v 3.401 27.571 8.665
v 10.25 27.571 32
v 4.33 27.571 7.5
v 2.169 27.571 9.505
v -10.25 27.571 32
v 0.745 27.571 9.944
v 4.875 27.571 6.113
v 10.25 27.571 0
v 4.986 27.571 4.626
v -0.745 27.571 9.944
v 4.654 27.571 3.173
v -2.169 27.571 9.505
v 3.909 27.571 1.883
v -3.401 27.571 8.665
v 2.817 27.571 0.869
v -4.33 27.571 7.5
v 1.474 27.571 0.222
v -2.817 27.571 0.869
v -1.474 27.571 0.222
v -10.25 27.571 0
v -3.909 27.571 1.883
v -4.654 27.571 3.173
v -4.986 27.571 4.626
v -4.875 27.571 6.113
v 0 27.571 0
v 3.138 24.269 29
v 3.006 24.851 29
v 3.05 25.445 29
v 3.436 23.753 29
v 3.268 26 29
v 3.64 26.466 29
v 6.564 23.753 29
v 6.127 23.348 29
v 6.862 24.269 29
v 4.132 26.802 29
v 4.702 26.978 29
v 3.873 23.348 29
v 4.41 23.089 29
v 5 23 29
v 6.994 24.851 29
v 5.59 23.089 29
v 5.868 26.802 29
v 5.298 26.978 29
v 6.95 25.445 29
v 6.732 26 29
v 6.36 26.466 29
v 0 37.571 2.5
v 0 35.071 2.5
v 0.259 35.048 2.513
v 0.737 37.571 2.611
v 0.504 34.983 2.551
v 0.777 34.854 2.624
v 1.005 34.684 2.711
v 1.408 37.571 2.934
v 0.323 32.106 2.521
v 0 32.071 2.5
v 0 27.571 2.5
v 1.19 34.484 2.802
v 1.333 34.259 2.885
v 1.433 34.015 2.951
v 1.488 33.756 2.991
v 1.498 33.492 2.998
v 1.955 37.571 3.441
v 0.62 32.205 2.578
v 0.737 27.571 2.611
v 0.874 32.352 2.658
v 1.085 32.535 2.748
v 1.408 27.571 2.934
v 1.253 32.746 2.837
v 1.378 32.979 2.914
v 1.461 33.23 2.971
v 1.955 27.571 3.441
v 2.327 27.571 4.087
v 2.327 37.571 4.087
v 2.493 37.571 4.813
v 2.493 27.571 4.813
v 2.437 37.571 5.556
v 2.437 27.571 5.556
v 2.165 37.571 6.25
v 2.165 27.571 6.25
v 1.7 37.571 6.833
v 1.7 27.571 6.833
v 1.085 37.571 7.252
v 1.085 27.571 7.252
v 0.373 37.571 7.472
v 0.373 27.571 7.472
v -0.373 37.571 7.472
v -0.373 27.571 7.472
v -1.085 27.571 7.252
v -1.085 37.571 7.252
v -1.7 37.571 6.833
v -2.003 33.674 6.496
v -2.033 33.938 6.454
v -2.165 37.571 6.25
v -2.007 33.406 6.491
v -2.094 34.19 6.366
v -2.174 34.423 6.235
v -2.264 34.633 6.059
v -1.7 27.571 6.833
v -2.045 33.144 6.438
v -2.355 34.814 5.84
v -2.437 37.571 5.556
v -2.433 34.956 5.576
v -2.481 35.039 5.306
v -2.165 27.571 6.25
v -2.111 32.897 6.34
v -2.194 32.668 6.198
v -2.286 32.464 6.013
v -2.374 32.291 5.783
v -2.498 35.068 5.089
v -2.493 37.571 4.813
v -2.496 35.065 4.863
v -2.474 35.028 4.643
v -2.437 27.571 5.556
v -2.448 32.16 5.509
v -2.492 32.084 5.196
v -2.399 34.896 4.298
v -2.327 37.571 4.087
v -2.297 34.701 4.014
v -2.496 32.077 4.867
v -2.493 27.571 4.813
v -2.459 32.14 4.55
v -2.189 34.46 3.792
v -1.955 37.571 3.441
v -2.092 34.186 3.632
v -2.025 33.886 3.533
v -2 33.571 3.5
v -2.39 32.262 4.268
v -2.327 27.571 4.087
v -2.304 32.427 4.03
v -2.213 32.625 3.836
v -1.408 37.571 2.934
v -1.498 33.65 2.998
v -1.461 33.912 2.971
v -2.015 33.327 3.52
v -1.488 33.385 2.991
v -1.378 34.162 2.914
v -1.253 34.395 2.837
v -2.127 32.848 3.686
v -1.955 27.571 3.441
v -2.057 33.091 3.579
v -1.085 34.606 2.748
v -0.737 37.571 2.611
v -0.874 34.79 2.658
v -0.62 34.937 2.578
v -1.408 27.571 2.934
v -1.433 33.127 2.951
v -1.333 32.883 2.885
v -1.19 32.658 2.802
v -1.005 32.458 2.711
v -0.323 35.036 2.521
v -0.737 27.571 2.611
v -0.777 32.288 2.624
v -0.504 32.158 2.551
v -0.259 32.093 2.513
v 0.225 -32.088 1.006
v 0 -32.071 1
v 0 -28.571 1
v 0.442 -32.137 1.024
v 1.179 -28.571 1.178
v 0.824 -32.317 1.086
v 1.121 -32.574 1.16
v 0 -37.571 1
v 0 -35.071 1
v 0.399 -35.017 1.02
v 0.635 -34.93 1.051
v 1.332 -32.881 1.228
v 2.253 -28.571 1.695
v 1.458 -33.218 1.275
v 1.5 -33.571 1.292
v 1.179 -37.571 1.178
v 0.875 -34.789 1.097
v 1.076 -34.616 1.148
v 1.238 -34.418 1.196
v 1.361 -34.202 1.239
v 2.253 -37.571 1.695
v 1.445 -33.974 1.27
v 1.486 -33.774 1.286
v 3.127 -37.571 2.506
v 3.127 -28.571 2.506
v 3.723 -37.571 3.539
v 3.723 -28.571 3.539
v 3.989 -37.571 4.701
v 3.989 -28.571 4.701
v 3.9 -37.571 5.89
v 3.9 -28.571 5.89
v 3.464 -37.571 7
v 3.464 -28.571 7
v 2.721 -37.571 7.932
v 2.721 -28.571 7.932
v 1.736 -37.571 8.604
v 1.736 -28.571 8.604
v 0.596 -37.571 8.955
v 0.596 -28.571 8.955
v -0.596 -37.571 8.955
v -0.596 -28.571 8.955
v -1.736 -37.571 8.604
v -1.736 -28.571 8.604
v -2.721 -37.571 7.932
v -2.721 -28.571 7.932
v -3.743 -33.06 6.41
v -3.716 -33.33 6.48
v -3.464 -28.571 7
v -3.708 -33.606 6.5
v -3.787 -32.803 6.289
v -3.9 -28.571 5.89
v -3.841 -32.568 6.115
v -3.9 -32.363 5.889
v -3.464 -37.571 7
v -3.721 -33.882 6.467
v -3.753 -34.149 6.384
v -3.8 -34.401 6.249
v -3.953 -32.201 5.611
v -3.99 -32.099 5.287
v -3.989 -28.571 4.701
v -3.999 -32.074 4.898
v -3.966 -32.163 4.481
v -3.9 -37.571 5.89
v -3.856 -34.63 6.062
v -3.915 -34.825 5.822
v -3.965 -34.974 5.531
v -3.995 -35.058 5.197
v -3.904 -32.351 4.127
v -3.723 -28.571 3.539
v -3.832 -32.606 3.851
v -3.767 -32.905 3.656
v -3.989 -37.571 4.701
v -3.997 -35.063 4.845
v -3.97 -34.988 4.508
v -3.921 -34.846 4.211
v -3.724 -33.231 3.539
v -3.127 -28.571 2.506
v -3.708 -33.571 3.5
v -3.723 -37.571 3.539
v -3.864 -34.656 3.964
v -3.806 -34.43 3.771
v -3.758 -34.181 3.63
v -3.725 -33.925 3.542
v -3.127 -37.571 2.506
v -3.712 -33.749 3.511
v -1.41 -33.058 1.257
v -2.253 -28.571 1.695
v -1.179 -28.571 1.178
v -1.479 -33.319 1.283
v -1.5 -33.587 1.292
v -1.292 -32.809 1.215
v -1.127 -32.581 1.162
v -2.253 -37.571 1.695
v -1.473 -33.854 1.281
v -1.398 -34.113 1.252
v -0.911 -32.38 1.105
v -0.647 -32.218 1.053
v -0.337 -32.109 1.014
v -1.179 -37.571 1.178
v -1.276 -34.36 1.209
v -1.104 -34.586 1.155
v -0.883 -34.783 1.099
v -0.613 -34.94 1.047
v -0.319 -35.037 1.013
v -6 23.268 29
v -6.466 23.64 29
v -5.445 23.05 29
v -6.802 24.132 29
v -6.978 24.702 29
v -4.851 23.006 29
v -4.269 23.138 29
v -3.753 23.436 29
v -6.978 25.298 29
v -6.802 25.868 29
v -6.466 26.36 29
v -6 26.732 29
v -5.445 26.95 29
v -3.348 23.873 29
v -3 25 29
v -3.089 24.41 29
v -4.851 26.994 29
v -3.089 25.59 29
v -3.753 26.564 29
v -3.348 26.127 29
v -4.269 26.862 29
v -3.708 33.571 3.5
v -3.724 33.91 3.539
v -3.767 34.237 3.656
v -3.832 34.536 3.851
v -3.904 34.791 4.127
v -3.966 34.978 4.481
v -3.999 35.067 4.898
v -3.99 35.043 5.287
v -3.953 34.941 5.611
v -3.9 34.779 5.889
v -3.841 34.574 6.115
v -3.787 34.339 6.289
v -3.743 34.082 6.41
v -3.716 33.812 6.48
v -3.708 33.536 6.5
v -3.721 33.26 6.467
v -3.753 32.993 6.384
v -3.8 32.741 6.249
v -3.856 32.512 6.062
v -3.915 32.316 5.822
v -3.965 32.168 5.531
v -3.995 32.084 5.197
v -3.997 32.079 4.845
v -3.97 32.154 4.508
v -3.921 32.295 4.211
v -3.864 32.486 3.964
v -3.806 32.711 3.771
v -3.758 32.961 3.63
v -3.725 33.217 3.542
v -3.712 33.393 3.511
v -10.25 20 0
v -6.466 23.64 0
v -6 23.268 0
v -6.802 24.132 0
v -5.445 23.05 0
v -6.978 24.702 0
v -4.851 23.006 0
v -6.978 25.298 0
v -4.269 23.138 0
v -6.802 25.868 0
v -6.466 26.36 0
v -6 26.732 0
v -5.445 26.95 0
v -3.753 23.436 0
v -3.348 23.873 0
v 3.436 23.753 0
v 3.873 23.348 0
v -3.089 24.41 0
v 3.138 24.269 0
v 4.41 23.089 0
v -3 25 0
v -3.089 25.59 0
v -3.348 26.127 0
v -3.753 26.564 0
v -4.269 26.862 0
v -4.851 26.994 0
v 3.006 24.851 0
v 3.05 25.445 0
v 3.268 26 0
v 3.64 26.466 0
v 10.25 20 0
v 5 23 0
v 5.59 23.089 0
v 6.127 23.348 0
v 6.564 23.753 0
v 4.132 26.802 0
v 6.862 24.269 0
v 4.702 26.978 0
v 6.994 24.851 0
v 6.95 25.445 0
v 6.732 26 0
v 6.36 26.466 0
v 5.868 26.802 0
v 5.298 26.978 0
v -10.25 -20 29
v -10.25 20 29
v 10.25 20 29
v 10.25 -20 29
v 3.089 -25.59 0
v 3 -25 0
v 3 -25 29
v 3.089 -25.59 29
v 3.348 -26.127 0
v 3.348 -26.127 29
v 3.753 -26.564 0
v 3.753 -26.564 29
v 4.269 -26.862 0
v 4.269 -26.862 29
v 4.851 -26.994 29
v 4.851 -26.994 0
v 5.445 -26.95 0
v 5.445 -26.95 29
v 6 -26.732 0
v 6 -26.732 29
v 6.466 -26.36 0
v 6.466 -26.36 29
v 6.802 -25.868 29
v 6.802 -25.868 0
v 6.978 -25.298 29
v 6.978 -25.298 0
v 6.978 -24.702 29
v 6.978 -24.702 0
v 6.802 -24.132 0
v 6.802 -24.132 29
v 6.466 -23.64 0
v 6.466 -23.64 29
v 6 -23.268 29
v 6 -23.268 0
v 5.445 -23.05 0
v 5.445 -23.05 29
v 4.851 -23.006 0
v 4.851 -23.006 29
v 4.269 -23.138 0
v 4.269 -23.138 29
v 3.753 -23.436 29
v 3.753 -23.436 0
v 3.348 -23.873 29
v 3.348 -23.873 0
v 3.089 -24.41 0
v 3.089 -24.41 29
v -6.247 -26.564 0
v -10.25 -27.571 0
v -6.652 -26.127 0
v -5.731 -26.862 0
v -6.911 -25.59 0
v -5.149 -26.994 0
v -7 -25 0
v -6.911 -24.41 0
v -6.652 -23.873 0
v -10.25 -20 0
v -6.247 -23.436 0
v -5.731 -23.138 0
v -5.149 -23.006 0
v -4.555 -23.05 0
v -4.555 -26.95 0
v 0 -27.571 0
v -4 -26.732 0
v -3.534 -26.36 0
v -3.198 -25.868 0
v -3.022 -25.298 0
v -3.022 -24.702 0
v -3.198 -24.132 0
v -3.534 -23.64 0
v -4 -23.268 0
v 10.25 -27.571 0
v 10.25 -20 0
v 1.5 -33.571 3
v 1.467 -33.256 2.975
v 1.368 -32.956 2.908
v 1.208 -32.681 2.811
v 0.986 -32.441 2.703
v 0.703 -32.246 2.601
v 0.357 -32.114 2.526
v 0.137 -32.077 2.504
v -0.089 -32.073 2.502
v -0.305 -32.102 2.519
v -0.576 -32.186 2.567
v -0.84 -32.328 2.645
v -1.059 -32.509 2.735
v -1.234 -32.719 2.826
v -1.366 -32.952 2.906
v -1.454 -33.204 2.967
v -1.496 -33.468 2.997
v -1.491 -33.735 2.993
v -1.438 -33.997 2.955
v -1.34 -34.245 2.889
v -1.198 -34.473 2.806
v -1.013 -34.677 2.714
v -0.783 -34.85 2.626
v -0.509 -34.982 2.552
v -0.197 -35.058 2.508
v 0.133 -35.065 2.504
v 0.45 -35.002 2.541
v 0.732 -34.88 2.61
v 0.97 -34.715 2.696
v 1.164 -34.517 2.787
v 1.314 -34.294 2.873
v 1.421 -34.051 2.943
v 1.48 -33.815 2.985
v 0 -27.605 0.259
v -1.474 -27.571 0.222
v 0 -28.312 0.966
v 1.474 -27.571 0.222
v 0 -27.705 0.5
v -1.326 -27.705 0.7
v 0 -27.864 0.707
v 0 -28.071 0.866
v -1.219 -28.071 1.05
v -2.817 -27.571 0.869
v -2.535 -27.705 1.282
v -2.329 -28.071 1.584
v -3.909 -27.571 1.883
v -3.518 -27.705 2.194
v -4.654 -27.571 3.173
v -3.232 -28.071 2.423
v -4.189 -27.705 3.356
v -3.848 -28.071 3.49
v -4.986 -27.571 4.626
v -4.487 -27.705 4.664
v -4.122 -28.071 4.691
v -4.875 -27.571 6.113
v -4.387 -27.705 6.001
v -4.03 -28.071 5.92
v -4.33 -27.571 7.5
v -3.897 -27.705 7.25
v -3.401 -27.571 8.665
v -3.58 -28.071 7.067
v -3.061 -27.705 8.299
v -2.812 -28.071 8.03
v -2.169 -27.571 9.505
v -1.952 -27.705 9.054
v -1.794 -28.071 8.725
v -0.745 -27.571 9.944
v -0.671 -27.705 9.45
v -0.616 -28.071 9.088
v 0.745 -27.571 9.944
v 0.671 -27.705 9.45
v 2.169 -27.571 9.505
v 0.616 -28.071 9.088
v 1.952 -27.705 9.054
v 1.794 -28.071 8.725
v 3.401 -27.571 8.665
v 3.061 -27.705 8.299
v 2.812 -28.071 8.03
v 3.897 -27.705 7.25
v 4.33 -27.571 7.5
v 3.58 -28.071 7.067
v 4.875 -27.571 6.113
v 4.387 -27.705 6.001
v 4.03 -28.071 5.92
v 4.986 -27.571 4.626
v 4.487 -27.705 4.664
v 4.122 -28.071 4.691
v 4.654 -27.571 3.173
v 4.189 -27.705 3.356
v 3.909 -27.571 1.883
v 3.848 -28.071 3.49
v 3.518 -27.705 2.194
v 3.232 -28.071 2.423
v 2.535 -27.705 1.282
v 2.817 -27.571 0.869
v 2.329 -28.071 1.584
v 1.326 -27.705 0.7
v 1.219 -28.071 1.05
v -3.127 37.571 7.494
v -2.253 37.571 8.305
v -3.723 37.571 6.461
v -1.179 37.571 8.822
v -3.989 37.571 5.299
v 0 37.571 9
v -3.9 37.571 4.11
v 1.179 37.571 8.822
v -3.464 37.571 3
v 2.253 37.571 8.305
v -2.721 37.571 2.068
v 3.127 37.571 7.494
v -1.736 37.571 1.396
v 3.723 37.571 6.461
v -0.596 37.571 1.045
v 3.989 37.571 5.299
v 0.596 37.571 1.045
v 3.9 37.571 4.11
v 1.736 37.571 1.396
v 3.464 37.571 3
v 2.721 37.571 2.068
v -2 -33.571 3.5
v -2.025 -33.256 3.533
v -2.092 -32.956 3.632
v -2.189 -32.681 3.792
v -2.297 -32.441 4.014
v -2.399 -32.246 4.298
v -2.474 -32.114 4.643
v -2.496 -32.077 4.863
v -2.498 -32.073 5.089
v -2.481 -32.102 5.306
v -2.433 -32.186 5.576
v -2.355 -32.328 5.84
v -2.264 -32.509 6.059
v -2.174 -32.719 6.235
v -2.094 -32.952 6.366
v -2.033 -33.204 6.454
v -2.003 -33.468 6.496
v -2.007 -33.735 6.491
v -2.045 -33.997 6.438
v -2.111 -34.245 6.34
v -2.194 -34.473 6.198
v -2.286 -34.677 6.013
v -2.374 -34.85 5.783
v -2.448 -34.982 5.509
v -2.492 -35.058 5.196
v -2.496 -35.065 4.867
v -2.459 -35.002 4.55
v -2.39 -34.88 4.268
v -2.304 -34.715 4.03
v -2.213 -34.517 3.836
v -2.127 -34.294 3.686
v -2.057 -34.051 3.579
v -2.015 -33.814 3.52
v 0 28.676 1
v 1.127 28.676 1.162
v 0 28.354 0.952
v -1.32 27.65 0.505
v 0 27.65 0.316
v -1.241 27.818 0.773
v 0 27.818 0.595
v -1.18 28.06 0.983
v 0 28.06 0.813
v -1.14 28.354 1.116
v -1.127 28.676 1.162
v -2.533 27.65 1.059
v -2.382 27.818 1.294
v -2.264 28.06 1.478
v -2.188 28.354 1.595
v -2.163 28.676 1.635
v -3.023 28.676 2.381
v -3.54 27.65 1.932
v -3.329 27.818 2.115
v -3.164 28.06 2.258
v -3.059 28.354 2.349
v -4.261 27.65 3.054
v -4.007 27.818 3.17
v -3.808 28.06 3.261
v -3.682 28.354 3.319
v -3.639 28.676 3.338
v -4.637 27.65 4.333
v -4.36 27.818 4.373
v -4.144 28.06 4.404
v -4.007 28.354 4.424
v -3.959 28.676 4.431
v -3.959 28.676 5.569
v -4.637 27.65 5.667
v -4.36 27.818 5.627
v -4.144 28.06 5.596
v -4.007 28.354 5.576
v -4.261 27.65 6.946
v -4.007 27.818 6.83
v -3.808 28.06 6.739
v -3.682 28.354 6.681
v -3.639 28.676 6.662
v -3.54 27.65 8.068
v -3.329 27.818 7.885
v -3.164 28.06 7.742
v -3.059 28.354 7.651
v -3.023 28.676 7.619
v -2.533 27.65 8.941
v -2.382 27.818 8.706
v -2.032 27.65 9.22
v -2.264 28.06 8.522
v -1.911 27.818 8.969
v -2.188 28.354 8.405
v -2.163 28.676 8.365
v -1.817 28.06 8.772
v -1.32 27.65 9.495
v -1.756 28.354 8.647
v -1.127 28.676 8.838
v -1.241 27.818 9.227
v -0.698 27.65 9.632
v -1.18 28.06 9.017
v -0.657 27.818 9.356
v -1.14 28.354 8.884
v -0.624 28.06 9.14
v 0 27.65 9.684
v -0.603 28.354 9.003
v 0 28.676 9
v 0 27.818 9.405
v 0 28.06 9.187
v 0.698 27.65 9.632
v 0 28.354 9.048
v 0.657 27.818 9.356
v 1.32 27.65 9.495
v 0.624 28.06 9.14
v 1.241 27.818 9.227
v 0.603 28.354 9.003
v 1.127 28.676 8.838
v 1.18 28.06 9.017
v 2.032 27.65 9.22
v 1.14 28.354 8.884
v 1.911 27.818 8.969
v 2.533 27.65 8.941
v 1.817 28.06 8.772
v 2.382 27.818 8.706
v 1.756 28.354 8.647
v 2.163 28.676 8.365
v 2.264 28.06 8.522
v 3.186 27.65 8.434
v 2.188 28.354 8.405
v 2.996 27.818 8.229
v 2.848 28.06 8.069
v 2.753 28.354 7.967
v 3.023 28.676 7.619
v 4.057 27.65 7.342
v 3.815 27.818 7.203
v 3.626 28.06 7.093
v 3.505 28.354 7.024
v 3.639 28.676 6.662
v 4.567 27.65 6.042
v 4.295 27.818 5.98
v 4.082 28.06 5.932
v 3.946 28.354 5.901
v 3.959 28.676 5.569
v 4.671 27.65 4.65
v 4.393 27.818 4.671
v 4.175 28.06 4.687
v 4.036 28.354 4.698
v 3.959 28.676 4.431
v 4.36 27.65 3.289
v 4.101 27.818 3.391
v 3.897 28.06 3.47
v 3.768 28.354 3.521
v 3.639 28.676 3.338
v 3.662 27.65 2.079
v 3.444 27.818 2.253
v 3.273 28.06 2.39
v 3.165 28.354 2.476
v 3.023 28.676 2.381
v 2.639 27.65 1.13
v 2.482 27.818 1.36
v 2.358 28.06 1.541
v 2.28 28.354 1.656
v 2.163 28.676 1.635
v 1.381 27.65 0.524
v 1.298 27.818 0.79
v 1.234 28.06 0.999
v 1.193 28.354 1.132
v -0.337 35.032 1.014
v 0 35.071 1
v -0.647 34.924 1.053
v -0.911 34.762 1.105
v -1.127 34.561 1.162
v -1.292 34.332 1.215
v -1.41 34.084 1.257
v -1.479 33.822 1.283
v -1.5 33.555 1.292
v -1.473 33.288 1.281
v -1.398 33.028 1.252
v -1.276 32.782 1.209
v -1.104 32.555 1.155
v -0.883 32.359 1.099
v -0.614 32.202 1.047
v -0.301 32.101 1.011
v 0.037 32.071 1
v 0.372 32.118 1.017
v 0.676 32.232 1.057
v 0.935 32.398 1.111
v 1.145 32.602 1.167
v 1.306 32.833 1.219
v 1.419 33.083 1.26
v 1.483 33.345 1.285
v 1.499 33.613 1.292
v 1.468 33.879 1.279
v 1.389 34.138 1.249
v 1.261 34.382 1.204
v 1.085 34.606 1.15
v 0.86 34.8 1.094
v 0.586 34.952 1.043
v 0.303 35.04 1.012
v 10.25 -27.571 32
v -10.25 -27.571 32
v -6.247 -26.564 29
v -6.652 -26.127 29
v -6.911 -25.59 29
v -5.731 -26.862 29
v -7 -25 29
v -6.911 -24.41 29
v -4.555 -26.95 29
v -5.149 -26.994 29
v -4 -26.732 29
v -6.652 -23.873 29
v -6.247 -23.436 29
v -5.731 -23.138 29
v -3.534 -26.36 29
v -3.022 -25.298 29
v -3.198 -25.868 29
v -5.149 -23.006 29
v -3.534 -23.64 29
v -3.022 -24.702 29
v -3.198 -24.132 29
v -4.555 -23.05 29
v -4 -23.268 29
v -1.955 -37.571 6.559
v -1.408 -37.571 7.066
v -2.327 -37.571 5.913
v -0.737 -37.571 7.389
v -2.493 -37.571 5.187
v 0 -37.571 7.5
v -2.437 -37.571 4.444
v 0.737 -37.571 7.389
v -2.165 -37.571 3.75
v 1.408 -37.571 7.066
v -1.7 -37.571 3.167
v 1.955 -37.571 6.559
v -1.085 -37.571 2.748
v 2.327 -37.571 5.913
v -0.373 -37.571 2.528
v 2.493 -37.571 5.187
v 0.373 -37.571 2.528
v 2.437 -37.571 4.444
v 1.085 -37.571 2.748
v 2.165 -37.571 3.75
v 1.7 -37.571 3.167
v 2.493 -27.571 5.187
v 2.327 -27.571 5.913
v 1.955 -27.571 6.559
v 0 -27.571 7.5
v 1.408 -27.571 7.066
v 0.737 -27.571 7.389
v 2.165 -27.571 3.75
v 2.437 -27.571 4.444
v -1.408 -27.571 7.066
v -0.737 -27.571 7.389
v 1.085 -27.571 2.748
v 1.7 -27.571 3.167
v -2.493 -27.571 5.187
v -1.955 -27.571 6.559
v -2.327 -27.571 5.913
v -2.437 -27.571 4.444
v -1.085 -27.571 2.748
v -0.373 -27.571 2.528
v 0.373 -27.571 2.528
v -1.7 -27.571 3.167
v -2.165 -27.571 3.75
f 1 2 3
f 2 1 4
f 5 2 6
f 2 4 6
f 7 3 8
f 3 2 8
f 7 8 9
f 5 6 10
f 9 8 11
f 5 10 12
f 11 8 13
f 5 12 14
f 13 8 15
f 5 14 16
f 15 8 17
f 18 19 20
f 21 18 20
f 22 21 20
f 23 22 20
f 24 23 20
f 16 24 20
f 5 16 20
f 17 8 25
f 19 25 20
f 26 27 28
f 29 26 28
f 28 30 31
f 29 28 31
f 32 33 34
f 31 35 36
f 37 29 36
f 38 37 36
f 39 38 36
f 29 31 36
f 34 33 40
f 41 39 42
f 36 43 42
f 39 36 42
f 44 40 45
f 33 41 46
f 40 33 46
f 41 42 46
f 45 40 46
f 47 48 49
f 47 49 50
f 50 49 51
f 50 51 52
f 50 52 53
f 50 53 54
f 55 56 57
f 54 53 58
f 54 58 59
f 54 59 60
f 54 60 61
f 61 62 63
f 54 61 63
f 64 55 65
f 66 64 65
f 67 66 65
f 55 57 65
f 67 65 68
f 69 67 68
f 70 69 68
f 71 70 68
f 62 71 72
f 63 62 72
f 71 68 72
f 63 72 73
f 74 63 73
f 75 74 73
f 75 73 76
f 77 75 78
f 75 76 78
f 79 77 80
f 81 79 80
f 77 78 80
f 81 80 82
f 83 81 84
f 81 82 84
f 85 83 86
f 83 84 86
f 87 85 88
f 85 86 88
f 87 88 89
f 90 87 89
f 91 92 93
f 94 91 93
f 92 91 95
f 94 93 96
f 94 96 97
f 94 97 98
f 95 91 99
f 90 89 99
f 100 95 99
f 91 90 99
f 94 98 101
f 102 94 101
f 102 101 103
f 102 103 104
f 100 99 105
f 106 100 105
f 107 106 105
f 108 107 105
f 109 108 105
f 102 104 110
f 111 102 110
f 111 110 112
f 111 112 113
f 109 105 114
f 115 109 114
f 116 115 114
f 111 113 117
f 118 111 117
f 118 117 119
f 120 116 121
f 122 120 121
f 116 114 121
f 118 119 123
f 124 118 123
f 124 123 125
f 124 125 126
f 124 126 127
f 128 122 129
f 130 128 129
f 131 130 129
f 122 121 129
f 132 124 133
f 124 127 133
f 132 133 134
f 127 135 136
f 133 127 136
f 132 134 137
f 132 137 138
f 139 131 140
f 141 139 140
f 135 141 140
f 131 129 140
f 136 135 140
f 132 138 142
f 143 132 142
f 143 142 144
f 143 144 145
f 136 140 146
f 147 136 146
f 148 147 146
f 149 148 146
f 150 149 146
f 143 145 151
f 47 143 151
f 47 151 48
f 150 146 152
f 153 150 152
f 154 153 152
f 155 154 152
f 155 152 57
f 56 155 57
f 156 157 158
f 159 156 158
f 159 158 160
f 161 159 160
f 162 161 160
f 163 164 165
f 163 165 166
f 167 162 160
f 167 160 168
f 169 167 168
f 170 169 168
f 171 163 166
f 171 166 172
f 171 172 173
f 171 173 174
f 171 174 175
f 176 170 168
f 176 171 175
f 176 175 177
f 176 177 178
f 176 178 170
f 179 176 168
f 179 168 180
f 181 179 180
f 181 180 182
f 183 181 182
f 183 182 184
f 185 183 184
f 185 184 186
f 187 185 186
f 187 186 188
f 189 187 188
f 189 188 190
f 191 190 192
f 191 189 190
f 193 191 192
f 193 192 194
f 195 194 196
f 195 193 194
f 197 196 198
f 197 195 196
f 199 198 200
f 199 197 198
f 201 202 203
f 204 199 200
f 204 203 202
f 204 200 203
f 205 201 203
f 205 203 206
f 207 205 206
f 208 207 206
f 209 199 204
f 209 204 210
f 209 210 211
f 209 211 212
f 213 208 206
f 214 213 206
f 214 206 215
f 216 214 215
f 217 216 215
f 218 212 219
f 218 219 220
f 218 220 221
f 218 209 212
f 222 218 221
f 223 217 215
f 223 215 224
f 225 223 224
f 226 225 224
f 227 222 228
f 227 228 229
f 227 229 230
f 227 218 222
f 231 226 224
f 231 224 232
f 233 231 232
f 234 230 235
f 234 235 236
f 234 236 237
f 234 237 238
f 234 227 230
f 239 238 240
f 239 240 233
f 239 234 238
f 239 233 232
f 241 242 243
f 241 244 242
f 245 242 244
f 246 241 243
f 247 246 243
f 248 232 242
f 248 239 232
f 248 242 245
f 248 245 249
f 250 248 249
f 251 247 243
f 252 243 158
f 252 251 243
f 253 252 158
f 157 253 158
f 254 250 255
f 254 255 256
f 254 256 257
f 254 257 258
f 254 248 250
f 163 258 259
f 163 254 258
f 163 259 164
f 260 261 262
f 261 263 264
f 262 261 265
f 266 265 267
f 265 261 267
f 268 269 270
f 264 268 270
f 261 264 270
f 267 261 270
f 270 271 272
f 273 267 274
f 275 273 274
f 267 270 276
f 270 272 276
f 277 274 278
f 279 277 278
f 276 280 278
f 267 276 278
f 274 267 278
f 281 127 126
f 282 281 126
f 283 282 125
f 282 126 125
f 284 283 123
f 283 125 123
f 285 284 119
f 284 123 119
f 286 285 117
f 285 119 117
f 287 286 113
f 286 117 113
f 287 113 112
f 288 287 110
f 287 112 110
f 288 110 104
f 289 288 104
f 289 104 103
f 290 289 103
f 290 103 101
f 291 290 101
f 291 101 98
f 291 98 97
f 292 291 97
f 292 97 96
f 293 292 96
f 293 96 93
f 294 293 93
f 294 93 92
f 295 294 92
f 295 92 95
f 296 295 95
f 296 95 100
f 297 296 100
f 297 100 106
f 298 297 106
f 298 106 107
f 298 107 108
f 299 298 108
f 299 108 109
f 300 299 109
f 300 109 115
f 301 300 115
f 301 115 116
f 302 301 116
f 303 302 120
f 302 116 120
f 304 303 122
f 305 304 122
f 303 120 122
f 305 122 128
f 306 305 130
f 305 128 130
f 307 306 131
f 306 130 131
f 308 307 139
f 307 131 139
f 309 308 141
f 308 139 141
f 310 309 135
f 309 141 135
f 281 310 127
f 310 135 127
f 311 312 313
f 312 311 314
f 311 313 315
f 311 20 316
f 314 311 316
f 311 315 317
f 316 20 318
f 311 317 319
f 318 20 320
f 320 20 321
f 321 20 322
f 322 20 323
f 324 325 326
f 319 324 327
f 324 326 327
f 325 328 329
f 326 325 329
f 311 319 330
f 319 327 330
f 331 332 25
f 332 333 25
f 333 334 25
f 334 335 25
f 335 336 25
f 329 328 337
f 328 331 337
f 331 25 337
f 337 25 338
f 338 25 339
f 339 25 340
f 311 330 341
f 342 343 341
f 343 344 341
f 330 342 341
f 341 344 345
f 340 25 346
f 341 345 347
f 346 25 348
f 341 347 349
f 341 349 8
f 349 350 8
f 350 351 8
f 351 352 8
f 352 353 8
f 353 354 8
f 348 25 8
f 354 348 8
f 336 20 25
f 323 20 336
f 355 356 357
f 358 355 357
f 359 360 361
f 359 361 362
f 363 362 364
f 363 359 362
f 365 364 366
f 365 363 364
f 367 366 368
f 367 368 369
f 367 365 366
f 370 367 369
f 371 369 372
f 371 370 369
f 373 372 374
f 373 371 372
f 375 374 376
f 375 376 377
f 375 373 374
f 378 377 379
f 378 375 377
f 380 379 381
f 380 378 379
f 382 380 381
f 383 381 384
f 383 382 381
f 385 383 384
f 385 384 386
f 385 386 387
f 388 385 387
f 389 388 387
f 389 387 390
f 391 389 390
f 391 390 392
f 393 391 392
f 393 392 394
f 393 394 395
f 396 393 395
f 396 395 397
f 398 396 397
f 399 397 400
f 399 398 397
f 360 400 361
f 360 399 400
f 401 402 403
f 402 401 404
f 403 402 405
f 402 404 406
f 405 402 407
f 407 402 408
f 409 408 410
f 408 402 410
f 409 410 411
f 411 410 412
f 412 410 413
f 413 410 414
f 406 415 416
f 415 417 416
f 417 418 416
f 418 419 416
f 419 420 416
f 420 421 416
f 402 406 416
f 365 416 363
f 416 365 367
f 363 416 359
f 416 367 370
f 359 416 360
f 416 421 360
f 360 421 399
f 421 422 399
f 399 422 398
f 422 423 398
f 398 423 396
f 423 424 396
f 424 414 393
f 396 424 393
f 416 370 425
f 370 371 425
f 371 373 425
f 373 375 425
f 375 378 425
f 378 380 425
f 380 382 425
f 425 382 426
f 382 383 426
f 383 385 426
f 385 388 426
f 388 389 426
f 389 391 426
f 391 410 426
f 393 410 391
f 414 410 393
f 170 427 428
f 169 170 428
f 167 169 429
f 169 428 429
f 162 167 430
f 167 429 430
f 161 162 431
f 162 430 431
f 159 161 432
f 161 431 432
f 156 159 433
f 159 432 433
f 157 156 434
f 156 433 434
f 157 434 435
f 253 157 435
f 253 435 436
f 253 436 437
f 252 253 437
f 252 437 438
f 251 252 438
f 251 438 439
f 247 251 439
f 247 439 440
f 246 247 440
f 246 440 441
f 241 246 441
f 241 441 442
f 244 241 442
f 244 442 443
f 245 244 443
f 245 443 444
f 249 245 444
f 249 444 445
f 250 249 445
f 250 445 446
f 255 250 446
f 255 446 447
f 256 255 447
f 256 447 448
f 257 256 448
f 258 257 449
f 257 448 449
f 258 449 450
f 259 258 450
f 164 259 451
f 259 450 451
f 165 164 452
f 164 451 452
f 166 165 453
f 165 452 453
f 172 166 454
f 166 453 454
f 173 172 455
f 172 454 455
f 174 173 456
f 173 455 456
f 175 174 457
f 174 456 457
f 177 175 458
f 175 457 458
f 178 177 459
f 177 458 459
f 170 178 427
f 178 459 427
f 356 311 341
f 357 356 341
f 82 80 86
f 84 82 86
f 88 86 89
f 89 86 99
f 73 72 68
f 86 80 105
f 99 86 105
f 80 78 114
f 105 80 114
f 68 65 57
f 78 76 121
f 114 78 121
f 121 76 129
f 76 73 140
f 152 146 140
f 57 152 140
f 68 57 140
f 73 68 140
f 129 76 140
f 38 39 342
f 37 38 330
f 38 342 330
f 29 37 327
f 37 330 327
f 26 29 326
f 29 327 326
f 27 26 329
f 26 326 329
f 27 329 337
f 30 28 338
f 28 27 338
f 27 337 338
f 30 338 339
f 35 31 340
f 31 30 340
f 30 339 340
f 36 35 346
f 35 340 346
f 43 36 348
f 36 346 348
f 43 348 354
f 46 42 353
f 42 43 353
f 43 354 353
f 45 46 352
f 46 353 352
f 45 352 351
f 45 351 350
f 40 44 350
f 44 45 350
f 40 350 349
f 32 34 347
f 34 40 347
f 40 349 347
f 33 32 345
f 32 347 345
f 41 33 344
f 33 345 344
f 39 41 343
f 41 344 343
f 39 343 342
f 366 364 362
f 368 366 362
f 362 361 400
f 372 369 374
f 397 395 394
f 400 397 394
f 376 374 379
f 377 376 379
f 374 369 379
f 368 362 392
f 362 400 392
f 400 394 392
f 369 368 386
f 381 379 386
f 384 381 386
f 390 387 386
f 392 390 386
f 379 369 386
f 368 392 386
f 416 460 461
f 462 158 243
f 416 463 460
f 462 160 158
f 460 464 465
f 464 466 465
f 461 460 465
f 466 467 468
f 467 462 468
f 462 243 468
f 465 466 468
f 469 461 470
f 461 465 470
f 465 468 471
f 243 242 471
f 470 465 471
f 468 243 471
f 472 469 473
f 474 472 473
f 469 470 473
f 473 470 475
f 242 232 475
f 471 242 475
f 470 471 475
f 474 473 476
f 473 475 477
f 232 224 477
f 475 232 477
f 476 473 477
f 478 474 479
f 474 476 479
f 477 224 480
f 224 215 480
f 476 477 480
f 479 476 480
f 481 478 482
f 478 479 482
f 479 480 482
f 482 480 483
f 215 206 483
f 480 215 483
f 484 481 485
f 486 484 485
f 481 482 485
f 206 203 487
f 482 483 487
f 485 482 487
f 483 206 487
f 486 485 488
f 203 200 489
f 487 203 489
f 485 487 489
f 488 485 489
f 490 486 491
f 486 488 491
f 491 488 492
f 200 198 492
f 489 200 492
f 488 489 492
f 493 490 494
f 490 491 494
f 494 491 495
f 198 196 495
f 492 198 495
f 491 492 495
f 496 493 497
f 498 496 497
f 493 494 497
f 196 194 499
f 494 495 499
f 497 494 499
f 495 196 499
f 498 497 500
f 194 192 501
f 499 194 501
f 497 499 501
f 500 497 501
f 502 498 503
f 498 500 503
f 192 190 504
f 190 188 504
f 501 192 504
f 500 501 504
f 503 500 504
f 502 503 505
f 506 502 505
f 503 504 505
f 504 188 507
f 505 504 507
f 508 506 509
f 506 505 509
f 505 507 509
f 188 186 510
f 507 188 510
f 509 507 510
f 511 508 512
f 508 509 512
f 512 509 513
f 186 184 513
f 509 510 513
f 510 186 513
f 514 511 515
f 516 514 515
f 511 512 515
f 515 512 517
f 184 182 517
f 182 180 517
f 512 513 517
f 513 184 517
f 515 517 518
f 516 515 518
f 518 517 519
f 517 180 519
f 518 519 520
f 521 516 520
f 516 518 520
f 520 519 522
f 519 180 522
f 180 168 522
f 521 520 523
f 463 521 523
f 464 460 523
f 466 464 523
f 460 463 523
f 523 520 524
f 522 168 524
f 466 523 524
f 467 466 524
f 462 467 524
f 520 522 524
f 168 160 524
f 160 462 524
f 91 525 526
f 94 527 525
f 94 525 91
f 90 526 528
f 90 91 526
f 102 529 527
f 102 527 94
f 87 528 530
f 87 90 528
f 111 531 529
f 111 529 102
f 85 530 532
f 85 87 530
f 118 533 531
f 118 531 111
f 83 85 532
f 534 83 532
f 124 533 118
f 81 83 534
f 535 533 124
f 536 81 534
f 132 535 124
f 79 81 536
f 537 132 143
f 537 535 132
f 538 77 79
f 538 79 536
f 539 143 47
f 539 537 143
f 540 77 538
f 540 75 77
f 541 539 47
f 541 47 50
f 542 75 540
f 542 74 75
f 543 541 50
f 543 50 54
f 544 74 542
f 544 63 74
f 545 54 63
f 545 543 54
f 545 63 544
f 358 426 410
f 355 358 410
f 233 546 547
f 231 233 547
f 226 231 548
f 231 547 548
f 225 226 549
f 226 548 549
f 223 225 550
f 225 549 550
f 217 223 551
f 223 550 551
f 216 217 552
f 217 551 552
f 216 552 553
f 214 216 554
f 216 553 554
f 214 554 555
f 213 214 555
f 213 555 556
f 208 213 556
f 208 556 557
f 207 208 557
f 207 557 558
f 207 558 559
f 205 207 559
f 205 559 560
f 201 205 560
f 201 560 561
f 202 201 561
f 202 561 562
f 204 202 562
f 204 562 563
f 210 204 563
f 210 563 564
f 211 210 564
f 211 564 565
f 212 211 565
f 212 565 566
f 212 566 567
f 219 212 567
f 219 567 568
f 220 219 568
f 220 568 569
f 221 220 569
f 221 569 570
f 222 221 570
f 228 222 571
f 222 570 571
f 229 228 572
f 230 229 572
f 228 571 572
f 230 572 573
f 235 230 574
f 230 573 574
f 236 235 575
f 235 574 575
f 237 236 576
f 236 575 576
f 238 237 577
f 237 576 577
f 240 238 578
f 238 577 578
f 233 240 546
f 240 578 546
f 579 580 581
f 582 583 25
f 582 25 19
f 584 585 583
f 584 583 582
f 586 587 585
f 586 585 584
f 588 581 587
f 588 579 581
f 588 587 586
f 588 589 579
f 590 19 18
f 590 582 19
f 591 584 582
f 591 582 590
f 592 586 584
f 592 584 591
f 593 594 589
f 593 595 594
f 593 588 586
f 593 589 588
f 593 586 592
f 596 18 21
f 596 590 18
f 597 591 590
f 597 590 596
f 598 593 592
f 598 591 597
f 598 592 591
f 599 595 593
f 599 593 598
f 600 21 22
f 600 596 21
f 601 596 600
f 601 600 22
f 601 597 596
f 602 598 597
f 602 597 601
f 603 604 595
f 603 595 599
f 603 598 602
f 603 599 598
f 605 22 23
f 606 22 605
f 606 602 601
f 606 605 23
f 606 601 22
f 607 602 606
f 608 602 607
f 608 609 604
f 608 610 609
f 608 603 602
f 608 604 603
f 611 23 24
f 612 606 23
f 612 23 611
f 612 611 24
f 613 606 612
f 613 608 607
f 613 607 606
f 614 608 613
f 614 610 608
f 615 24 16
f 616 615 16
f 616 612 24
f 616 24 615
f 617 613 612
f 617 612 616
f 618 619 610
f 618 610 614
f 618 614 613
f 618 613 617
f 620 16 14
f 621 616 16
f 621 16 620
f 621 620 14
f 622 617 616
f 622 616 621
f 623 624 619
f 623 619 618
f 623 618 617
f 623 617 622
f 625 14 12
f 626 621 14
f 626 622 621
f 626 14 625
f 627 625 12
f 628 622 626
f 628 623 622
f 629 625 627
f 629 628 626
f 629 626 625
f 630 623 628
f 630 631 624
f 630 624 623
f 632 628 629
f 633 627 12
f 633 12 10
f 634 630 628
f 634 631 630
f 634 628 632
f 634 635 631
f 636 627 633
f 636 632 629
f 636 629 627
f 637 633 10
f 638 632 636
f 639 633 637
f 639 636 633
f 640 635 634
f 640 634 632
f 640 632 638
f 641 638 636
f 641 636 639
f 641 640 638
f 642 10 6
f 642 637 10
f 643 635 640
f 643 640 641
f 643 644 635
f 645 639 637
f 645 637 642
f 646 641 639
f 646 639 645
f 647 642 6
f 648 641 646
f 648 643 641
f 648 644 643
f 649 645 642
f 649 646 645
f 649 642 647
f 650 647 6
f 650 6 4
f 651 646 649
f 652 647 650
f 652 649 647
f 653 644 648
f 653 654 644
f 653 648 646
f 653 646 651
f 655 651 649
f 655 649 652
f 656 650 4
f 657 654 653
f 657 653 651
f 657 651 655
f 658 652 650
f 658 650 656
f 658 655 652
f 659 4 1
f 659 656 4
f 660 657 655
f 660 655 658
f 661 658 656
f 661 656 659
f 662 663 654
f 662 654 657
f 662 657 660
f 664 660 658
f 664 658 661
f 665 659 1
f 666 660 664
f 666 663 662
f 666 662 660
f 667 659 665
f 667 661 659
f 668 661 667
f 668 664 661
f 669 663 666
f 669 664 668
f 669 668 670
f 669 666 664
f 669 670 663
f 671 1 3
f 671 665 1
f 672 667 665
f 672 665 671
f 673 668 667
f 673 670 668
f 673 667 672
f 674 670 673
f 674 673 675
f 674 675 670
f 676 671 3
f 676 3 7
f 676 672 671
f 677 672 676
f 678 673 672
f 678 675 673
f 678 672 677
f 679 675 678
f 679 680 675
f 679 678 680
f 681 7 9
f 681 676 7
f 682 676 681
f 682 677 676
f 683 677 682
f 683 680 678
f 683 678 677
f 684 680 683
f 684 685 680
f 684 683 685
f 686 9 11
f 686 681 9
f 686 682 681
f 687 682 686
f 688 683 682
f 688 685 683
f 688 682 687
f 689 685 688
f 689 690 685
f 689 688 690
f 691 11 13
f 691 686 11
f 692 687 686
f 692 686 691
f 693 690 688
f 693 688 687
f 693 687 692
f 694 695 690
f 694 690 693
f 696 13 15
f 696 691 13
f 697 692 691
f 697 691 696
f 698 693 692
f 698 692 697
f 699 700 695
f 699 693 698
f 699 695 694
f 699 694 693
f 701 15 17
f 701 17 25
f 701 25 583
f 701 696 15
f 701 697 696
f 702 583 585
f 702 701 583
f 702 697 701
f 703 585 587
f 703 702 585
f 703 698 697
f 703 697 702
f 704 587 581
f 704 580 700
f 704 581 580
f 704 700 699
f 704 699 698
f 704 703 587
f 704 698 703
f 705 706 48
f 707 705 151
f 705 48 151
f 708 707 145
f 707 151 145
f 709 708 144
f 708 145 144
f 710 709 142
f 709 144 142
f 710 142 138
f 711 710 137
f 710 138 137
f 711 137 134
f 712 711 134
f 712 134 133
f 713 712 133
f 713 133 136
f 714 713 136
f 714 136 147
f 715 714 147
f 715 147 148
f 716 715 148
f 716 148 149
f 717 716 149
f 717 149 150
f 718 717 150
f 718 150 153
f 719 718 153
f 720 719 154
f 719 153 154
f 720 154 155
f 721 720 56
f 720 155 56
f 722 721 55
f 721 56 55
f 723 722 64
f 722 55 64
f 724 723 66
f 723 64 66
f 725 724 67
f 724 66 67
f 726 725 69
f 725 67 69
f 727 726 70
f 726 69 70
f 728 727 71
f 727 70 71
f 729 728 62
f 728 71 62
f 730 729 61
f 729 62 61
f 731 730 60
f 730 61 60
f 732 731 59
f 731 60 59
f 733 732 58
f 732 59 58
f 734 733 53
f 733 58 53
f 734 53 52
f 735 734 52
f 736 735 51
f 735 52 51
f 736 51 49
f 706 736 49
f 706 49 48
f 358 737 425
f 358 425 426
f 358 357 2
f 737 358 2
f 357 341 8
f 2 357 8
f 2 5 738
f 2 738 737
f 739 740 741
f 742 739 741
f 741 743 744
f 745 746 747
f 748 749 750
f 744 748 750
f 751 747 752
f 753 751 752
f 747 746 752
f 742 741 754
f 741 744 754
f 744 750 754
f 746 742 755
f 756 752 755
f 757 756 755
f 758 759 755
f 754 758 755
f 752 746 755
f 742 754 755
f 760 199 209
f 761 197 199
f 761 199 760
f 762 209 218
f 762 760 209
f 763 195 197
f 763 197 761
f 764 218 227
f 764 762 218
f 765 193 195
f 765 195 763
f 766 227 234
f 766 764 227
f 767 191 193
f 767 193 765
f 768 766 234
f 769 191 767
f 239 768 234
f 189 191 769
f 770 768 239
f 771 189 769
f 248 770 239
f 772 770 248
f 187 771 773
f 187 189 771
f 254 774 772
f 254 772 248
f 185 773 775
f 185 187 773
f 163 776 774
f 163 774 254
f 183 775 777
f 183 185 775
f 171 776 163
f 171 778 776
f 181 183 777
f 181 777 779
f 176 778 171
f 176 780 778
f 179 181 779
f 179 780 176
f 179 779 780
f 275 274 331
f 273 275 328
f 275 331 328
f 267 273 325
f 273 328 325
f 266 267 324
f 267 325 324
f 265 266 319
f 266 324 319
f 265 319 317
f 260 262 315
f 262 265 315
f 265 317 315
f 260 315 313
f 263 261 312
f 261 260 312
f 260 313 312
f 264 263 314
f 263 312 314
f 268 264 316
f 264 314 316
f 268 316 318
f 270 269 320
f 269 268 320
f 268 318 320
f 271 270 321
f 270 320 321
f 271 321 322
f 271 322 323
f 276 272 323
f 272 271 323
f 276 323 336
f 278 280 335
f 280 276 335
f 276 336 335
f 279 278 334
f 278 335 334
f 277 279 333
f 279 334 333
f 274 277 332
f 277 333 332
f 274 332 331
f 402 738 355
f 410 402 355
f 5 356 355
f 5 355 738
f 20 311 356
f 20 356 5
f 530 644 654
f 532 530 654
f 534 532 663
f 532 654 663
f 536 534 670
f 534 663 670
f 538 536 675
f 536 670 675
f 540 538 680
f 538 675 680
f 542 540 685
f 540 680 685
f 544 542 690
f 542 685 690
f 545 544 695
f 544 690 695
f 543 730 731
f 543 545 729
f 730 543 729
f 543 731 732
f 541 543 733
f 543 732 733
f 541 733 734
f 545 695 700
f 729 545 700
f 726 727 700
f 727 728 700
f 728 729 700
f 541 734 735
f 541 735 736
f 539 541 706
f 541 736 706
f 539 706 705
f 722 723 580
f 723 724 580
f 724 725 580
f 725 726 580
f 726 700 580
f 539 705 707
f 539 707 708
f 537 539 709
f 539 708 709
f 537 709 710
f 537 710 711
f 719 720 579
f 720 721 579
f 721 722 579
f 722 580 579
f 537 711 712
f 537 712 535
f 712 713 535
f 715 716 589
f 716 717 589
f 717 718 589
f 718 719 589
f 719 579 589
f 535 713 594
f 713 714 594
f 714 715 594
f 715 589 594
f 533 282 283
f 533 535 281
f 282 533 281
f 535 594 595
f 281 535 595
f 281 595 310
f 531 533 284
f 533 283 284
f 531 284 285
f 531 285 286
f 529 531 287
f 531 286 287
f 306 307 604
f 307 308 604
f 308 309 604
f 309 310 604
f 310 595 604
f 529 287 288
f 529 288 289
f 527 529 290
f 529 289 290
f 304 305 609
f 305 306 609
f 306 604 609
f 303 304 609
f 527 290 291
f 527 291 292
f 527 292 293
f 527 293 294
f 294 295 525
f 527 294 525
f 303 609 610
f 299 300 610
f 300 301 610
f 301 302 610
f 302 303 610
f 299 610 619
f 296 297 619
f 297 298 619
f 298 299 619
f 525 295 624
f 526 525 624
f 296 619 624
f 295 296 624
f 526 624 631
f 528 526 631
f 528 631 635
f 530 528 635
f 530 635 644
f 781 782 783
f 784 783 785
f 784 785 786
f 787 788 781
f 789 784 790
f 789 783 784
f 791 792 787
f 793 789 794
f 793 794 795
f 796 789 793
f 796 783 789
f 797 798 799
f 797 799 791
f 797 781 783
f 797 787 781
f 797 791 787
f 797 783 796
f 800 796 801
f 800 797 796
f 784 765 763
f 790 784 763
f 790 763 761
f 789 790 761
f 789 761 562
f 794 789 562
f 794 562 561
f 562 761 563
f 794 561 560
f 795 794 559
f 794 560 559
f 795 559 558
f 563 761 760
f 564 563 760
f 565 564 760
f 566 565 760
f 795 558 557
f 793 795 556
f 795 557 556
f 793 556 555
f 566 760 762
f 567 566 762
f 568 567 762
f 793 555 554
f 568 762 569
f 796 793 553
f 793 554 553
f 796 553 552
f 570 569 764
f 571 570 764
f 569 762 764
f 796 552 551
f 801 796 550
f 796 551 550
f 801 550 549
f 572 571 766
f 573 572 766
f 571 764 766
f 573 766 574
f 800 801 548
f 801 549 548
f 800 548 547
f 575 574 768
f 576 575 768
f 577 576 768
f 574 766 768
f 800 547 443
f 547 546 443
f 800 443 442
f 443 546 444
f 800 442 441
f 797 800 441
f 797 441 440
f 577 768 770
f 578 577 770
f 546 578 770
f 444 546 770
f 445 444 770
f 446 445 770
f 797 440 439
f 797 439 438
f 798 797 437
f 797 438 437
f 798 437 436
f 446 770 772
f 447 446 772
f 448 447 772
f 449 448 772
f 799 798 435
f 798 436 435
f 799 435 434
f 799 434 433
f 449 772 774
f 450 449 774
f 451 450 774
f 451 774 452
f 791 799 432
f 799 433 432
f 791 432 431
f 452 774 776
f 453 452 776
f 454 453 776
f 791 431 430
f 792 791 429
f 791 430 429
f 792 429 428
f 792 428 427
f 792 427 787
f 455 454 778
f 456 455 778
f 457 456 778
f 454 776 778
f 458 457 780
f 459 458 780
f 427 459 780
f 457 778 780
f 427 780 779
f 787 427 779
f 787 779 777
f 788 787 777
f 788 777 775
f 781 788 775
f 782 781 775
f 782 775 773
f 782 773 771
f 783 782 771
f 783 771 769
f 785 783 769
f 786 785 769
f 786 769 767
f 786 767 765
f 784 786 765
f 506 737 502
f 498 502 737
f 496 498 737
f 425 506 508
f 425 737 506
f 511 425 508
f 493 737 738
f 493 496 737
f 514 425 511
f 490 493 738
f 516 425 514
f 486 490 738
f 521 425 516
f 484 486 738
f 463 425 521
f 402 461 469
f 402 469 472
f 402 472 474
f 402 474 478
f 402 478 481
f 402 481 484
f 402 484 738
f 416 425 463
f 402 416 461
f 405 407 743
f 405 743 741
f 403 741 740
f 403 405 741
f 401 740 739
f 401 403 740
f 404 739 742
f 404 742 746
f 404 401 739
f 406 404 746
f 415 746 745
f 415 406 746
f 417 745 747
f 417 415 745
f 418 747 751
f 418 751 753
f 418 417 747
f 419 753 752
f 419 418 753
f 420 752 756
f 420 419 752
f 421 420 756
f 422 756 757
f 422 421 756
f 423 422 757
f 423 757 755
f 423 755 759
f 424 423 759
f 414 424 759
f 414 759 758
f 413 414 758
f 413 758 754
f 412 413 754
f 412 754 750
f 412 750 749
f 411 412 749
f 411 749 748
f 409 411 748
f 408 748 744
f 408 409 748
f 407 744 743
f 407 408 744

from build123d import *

# Parameters (mm, degrees)
SKETCH_1_R          = 2.000000000000001
EXTRUDE_1_DEPTH     = 29
SKETCH_2_W          = 20.5
SKETCH_2_H          = 70.28340969233892
EXTRUDE_2_DEPTH     = 3
SKETCH_3_W          = 20.5
SKETCH_3_H          = 7.570852423084727
CUT_EXTRUDE_1_DEPTH = 49.62100286394029
SKETCH_5_R          = 2.5
EXTRUDE_3_DEPTH     = 10
CUT_EXTRUDE_2_REACH = 75.297
SKETCH_8_R          = 1.6000000000000003
SKETCH_9_W          = 20.5
SKETCH_9_H          = 32
CUT_EXTRUDE_3_DEPTH = 65.57298284377197
SKETCH_12_W         = 20.499999999999996
SKETCH_12_H         = 7.57085242308473
SKETCH_12_R         = 2.0000000000000018
SKETCH_12_R_2       = 2.000000000000001
EXTRUDE_5_DEPTH     = 30
EXTRUDE_6_DEPTH     = 10
SKETCH_16_R         = 1.5000000000000004
CUT_EXTRUDE_5_DEPTH = 48.388093987806805
SKETCH_17_R         = 1.5000000000000004
CUT_EXTRUDE_6_DEPTH = 51.404676958704755
EXTRUDE_START       = 10
SKETCH_19_R         = 4
SKETCH_19_R_2       = 2.5000000000000004
EXTRUDE_7_DEPTH     = 10
SKETCH_21_R         = 1.5000000000000004
CUT_EXTRUDE_7_DEPTH = 48.38809406709012
SKETCH_22_R         = 1.5000000000000004
CUT_EXTRUDE_8_DEPTH = 51.404676958704755


with BuildPart() as part:
    # 草图1 → 凸台-拉伸1 (new body)
    # profile 1 of 3: a face of its own
    with BuildSketch(Plane.XY):
        with BuildLine():
            Line((-10.250000000000004, 35.14170484616946), (-10.250000000000004, 20))
            Line((-10.25, 20.000000000000004), (-4.999999999999999, 20.000000000000004))
            Line((-4.999999999999999, 20.000000000000004), (-4.999999999999999, 23.000000000000004))
            ThreePointArc((-5.000000000000001, 23.000000000000004), (-6.414213562373094, 26.4142135623731), (-2.9999999999999982, 25.000000000000004))
            Line((-2.9999999999999982, 25.000000000000004), (3, 25.000000000000004))
            ThreePointArc((3, 25.000000000000004), (5.000000000000001, 27.000000000000004), (7.000000000000002, 25.000000000000004))
            ThreePointArc((7.000000000000002, 25.000000000000004), (6.414213562373095, 23.585786437626908), (4.999999999999999, 23.000000000000004))
            Line((5.000000000000001, 23.000000000000004), (5.000000000000001, 20.000000000000004))
            Line((5, 20.000000000000004), (10.249999999999996, 20.000000000000004))
            Line((10.249999999999996, 20), (10.249999999999996, 35.14170484616946))
            Line((10.249999999999996, 35.14170484616946), (-10.250000000000004, 35.14170484616946))
        make_face()
    # profile 2 of 3: a face of its own
    with BuildSketch(Plane.XY):
        Polygon((10.249999999999996, -20), (-10.25, -20), (-10.250000000000004, -35.14170484616946), (10.249999999999996, -35.14170484616946), align=None)
        with Locations(Location((-4.999999999999999, -25.000000000000004, 0), (0, 0, 180))):
            Circle(SKETCH_1_R, mode=Mode.SUBTRACT)
        with Locations(Location((5.000000000000001, -25.000000000000004, 0), (0, 0, 180))):
            Circle(SKETCH_1_R, mode=Mode.SUBTRACT)
    # profile 3 of 3: a face of its own
    with BuildSketch(Plane.XY):
        with BuildLine():
            Line((-4.999999999999999, 23.000000000000004), (-4.999999999999999, 20.000000000000004))
            Line((-4.999999999999999, 20.000000000000004), (5, 20.000000000000004))
            Line((5.000000000000001, 20.000000000000004), (5.000000000000001, 23.000000000000004))
            ThreePointArc((4.999999999999999, 23.000000000000004), (3.585786437626904, 23.585786437626908), (3, 25.000000000000004))
            Line((3, 25.000000000000004), (-2.9999999999999982, 25.000000000000004))
            ThreePointArc((-2.9999999999999982, 25.000000000000004), (-3.585786437626905, 23.585786437626908), (-5.000000000000001, 23.000000000000004))
        make_face()
    extrude(amount=EXTRUDE_1_DEPTH)

    # 草图2 → 凸台-拉伸2 (add)
    with BuildSketch(Plane.XY.offset(29)):
        Rectangle(SKETCH_2_W, SKETCH_2_H)
    extrude(amount=EXTRUDE_2_DEPTH)

    # 草图3 → 切除-拉伸1 (cut, through all)
    with BuildSketch(Plane(origin=(0, 0, 0), x_dir=(-1, 0, 0), z_dir=(0, 0, -1))):
        with Locations((3.55e-15, -31.356278634627095)):
            Rectangle(SKETCH_3_W, SKETCH_3_H)
        Polygon((-10.249999999999996, 35.14170484616946), (-10.249999999999996, 27.57085242308473), (10.250000000000004, 27.570852423084734), (10.250000000000004, 35.14170484616946), align=None)
    extrude(amount=-CUT_EXTRUDE_1_DEPTH, mode=Mode.SUBTRACT)

    # 草图5 → 凸台-拉伸3 (add)
    with BuildSketch(Plane.XZ.offset(27.570852423084734)):
        with Locations(Location((0, 2.5, 0), (0, 0, 270))):
            Circle(SKETCH_5_R)
    extrude(amount=EXTRUDE_3_DEPTH)

    # 草图8 → 切除-拉伸2 (cut, up to next)
    with BuildSketch(Plane(origin=(0, 27.570852423084734, 0), x_dir=(1, 0, 0), z_dir=(0, 1, 0)), mode=Mode.PRIVATE) as cut_extrude_2_sk1:
        with Locations(Location((1.71e-15, -16.5, 0), (0, 0, 270))):
            Circle(SKETCH_8_R)
    cut_extrude_2_tool1 = extrude(cut_extrude_2_sk1.sketch, amount=-CUT_EXTRUDE_2_REACH, mode=Mode.PRIVATE) & part.part
    # 草图8 → 切除-拉伸2 (cut, up to next)
    with BuildSketch(Plane(origin=(0, 27.570852423084734, 0), x_dir=(1, 0, 0), z_dir=(0, 1, 0)), mode=Mode.PRIVATE) as cut_extrude_2_sk2:
        with Locations(Location((1.22e-15, -26.500000000000004, 0), (0, 0, 270))):
            Circle(SKETCH_8_R)
    cut_extrude_2_tool2 = extrude(cut_extrude_2_sk2.sketch, amount=-CUT_EXTRUDE_2_REACH, mode=Mode.PRIVATE) & part.part
    add(cut_extrude_2_tool1.solids().sort_by_distance((0, 27.570852, 16.5))[0], mode=Mode.SUBTRACT)
    add(cut_extrude_2_tool2.solids().sort_by_distance((0, 27.570852, 26.5))[0], mode=Mode.SUBTRACT)

    # 草图9 → 切除-拉伸3 (cut, through all)
    with BuildSketch(Plane.XZ.offset(27.570852423084734)):
        with Locations((-3.55e-15, 16)):
            Rectangle(SKETCH_9_W, SKETCH_9_H)
    extrude(amount=CUT_EXTRUDE_3_DEPTH, mode=Mode.SUBTRACT)

    # 草图12 → 凸台-拉伸5 (add)
    with BuildSketch(Plane(origin=(0, 0, 0), x_dir=(-1, 0, 0), z_dir=(0, 0, -1))):
        with Locations((1.78e-15, 23.78542621154237)):
            Rectangle(SKETCH_12_W, SKETCH_12_H)
        with Locations((-5.000000000000001, 25.000000000000004)):
            Circle(SKETCH_12_R, mode=Mode.SUBTRACT)
        with Locations((4.999999999999999, 25.000000000000004)):
            Circle(SKETCH_12_R_2, mode=Mode.SUBTRACT)
    extrude(amount=-EXTRUDE_5_DEPTH)

    # 草图13 → 凸台-拉伸6 (add)
    with BuildSketch(Plane(origin=(0, 27.570852423084734, 0), x_dir=(1, 0, 0), z_dir=(0, 1, 0))):
        with BuildLine():
            ThreePointArc((4.456e-14, -7.5), (-2.5, -5.000000000000058), (-7.084e-14, -2.4999999999999996))
            Line((-1.4e-16, -2.4999999999999996), (-5e-17, -1))
            ThreePointArc((7.635e-14, -1), (-3.9999999999999996, -4.999999999999907), (-1.067e-13, -9))
            Line((-4.9e-16, -9), (-4.1e-16, -7.5))
        make_face()
        with BuildLine():
            Line((-5e-17, -1), (-1.4e-16, -2.4999999999999996))
            ThreePointArc((-7.084e-14, -2.4999999999999996), (1.7677669529663447, -3.2322330470336054), (2.500000000000001, -5))
            ThreePointArc((2.500000000000001, -5.000000000000001), (1.767766952966385, -6.767766952966354), (4.456e-14, -7.5))
            Line((-4.1e-16, -7.5), (-4.9e-16, -9))
            ThreePointArc((-1.067e-13, -9), (2.828427124746152, -7.828427124746229), (4.000000000000001, -5.000000000000001))
            ThreePointArc((4.000000000000001, -5), (2.8284271247462174, -2.171572875253837), (7.635e-14, -1))
        make_face()
    extrude(amount=EXTRUDE_6_DEPTH)

    # 草图15 → 旋转1 (revolve)
    with BuildSketch(Plane(origin=(0, 0, 0), x_dir=(0, 0, -1), z_dir=(1, 0, 0))):
        with BuildLine():
            Line((-1, 27.570852423084734), (0, 27.570852423084734))
            ThreePointArc((0, 27.570852423084734), (-0.7128919117369903, 27.930797461014013), (-1, 28.676011694509246))
            Line((-1, 28.676011694509246), (-1, 27.570852423084734))
        make_face()
    revolve(axis=Axis((0, -962.4291475769152, 4.99999999999657), (0, 1, 3.43e-15)))

    # 草图16 → 切除-拉伸5 (cut, through all)
    with BuildSketch(Plane.XY.offset(5)):
        with Locations(Location((4.9e-16, 33.57085242308473, 0), (0, 0, 90))):
            Circle(SKETCH_16_R)
    extrude(amount=-CUT_EXTRUDE_5_DEPTH, mode=Mode.SUBTRACT)

    # 草图17 → 切除-拉伸6 (cut, through all)
    with BuildSketch(Plane(origin=(0, 0, 0), x_dir=(0, 0, -1), z_dir=(1, 0, 0))):
        with Locations((-5, 33.57085242308473)):
            Circle(SKETCH_17_R)
    extrude(amount=-CUT_EXTRUDE_6_DEPTH, mode=Mode.SUBTRACT)

    # 草图19 → 凸台-拉伸7 (add)
    with BuildSketch(Plane.XZ.offset(27.570852423084734).offset(EXTRUDE_START)):
        with Locations(Location((0, 4.999999999999998, 0), (0, 0, 270))):
            Circle(SKETCH_19_R)
        with Locations(Location((0, 4.999999999999998, 0), (0, 0, 90))):
            Circle(SKETCH_19_R_2, mode=Mode.SUBTRACT)
    extrude(amount=-EXTRUDE_7_DEPTH)

    # 草图20 → 旋转2 (revolve)
    with BuildSketch(Plane(origin=(0, 0, 0), x_dir=(0, 0, -1), z_dir=(1, 0, 0))):
        with BuildLine():
            Line((-0.9999999999999983, -27.570852423084734), (0, -27.570852423084734))
            ThreePointArc((0, -27.570852423084734), (-0.7071067811865462, -27.863745641898188), (-0.9999999999999981, -28.570852423084734))
            Line((-0.9999999999999981, -28.570852423084734), (-0.9999999999999983, -27.570852423084734))
        make_face()
    revolve(axis=Axis((0, -1027.5708524230847, 4.999999999996567), (0, 1, 3.43e-15)))

    # 草图21 → 切除-拉伸7 (cut, through all)
    with BuildSketch(Plane.XY.offset(5)):
        with Locations((0, -33.57085242308473)):
            Circle(SKETCH_21_R)
    extrude(amount=-CUT_EXTRUDE_7_DEPTH, mode=Mode.SUBTRACT)

    # 草图22 → 切除-拉伸8 (cut, through all)
    with BuildSketch(Plane(origin=(0, 0, 0), x_dir=(0, 0, -1), z_dir=(1, 0, 0))):
        with Locations((-5, -33.57085242308473)):
            Circle(SKETCH_22_R)
    extrude(amount=-CUT_EXTRUDE_8_DEPTH, mode=Mode.SUBTRACT)


solid = part.part
